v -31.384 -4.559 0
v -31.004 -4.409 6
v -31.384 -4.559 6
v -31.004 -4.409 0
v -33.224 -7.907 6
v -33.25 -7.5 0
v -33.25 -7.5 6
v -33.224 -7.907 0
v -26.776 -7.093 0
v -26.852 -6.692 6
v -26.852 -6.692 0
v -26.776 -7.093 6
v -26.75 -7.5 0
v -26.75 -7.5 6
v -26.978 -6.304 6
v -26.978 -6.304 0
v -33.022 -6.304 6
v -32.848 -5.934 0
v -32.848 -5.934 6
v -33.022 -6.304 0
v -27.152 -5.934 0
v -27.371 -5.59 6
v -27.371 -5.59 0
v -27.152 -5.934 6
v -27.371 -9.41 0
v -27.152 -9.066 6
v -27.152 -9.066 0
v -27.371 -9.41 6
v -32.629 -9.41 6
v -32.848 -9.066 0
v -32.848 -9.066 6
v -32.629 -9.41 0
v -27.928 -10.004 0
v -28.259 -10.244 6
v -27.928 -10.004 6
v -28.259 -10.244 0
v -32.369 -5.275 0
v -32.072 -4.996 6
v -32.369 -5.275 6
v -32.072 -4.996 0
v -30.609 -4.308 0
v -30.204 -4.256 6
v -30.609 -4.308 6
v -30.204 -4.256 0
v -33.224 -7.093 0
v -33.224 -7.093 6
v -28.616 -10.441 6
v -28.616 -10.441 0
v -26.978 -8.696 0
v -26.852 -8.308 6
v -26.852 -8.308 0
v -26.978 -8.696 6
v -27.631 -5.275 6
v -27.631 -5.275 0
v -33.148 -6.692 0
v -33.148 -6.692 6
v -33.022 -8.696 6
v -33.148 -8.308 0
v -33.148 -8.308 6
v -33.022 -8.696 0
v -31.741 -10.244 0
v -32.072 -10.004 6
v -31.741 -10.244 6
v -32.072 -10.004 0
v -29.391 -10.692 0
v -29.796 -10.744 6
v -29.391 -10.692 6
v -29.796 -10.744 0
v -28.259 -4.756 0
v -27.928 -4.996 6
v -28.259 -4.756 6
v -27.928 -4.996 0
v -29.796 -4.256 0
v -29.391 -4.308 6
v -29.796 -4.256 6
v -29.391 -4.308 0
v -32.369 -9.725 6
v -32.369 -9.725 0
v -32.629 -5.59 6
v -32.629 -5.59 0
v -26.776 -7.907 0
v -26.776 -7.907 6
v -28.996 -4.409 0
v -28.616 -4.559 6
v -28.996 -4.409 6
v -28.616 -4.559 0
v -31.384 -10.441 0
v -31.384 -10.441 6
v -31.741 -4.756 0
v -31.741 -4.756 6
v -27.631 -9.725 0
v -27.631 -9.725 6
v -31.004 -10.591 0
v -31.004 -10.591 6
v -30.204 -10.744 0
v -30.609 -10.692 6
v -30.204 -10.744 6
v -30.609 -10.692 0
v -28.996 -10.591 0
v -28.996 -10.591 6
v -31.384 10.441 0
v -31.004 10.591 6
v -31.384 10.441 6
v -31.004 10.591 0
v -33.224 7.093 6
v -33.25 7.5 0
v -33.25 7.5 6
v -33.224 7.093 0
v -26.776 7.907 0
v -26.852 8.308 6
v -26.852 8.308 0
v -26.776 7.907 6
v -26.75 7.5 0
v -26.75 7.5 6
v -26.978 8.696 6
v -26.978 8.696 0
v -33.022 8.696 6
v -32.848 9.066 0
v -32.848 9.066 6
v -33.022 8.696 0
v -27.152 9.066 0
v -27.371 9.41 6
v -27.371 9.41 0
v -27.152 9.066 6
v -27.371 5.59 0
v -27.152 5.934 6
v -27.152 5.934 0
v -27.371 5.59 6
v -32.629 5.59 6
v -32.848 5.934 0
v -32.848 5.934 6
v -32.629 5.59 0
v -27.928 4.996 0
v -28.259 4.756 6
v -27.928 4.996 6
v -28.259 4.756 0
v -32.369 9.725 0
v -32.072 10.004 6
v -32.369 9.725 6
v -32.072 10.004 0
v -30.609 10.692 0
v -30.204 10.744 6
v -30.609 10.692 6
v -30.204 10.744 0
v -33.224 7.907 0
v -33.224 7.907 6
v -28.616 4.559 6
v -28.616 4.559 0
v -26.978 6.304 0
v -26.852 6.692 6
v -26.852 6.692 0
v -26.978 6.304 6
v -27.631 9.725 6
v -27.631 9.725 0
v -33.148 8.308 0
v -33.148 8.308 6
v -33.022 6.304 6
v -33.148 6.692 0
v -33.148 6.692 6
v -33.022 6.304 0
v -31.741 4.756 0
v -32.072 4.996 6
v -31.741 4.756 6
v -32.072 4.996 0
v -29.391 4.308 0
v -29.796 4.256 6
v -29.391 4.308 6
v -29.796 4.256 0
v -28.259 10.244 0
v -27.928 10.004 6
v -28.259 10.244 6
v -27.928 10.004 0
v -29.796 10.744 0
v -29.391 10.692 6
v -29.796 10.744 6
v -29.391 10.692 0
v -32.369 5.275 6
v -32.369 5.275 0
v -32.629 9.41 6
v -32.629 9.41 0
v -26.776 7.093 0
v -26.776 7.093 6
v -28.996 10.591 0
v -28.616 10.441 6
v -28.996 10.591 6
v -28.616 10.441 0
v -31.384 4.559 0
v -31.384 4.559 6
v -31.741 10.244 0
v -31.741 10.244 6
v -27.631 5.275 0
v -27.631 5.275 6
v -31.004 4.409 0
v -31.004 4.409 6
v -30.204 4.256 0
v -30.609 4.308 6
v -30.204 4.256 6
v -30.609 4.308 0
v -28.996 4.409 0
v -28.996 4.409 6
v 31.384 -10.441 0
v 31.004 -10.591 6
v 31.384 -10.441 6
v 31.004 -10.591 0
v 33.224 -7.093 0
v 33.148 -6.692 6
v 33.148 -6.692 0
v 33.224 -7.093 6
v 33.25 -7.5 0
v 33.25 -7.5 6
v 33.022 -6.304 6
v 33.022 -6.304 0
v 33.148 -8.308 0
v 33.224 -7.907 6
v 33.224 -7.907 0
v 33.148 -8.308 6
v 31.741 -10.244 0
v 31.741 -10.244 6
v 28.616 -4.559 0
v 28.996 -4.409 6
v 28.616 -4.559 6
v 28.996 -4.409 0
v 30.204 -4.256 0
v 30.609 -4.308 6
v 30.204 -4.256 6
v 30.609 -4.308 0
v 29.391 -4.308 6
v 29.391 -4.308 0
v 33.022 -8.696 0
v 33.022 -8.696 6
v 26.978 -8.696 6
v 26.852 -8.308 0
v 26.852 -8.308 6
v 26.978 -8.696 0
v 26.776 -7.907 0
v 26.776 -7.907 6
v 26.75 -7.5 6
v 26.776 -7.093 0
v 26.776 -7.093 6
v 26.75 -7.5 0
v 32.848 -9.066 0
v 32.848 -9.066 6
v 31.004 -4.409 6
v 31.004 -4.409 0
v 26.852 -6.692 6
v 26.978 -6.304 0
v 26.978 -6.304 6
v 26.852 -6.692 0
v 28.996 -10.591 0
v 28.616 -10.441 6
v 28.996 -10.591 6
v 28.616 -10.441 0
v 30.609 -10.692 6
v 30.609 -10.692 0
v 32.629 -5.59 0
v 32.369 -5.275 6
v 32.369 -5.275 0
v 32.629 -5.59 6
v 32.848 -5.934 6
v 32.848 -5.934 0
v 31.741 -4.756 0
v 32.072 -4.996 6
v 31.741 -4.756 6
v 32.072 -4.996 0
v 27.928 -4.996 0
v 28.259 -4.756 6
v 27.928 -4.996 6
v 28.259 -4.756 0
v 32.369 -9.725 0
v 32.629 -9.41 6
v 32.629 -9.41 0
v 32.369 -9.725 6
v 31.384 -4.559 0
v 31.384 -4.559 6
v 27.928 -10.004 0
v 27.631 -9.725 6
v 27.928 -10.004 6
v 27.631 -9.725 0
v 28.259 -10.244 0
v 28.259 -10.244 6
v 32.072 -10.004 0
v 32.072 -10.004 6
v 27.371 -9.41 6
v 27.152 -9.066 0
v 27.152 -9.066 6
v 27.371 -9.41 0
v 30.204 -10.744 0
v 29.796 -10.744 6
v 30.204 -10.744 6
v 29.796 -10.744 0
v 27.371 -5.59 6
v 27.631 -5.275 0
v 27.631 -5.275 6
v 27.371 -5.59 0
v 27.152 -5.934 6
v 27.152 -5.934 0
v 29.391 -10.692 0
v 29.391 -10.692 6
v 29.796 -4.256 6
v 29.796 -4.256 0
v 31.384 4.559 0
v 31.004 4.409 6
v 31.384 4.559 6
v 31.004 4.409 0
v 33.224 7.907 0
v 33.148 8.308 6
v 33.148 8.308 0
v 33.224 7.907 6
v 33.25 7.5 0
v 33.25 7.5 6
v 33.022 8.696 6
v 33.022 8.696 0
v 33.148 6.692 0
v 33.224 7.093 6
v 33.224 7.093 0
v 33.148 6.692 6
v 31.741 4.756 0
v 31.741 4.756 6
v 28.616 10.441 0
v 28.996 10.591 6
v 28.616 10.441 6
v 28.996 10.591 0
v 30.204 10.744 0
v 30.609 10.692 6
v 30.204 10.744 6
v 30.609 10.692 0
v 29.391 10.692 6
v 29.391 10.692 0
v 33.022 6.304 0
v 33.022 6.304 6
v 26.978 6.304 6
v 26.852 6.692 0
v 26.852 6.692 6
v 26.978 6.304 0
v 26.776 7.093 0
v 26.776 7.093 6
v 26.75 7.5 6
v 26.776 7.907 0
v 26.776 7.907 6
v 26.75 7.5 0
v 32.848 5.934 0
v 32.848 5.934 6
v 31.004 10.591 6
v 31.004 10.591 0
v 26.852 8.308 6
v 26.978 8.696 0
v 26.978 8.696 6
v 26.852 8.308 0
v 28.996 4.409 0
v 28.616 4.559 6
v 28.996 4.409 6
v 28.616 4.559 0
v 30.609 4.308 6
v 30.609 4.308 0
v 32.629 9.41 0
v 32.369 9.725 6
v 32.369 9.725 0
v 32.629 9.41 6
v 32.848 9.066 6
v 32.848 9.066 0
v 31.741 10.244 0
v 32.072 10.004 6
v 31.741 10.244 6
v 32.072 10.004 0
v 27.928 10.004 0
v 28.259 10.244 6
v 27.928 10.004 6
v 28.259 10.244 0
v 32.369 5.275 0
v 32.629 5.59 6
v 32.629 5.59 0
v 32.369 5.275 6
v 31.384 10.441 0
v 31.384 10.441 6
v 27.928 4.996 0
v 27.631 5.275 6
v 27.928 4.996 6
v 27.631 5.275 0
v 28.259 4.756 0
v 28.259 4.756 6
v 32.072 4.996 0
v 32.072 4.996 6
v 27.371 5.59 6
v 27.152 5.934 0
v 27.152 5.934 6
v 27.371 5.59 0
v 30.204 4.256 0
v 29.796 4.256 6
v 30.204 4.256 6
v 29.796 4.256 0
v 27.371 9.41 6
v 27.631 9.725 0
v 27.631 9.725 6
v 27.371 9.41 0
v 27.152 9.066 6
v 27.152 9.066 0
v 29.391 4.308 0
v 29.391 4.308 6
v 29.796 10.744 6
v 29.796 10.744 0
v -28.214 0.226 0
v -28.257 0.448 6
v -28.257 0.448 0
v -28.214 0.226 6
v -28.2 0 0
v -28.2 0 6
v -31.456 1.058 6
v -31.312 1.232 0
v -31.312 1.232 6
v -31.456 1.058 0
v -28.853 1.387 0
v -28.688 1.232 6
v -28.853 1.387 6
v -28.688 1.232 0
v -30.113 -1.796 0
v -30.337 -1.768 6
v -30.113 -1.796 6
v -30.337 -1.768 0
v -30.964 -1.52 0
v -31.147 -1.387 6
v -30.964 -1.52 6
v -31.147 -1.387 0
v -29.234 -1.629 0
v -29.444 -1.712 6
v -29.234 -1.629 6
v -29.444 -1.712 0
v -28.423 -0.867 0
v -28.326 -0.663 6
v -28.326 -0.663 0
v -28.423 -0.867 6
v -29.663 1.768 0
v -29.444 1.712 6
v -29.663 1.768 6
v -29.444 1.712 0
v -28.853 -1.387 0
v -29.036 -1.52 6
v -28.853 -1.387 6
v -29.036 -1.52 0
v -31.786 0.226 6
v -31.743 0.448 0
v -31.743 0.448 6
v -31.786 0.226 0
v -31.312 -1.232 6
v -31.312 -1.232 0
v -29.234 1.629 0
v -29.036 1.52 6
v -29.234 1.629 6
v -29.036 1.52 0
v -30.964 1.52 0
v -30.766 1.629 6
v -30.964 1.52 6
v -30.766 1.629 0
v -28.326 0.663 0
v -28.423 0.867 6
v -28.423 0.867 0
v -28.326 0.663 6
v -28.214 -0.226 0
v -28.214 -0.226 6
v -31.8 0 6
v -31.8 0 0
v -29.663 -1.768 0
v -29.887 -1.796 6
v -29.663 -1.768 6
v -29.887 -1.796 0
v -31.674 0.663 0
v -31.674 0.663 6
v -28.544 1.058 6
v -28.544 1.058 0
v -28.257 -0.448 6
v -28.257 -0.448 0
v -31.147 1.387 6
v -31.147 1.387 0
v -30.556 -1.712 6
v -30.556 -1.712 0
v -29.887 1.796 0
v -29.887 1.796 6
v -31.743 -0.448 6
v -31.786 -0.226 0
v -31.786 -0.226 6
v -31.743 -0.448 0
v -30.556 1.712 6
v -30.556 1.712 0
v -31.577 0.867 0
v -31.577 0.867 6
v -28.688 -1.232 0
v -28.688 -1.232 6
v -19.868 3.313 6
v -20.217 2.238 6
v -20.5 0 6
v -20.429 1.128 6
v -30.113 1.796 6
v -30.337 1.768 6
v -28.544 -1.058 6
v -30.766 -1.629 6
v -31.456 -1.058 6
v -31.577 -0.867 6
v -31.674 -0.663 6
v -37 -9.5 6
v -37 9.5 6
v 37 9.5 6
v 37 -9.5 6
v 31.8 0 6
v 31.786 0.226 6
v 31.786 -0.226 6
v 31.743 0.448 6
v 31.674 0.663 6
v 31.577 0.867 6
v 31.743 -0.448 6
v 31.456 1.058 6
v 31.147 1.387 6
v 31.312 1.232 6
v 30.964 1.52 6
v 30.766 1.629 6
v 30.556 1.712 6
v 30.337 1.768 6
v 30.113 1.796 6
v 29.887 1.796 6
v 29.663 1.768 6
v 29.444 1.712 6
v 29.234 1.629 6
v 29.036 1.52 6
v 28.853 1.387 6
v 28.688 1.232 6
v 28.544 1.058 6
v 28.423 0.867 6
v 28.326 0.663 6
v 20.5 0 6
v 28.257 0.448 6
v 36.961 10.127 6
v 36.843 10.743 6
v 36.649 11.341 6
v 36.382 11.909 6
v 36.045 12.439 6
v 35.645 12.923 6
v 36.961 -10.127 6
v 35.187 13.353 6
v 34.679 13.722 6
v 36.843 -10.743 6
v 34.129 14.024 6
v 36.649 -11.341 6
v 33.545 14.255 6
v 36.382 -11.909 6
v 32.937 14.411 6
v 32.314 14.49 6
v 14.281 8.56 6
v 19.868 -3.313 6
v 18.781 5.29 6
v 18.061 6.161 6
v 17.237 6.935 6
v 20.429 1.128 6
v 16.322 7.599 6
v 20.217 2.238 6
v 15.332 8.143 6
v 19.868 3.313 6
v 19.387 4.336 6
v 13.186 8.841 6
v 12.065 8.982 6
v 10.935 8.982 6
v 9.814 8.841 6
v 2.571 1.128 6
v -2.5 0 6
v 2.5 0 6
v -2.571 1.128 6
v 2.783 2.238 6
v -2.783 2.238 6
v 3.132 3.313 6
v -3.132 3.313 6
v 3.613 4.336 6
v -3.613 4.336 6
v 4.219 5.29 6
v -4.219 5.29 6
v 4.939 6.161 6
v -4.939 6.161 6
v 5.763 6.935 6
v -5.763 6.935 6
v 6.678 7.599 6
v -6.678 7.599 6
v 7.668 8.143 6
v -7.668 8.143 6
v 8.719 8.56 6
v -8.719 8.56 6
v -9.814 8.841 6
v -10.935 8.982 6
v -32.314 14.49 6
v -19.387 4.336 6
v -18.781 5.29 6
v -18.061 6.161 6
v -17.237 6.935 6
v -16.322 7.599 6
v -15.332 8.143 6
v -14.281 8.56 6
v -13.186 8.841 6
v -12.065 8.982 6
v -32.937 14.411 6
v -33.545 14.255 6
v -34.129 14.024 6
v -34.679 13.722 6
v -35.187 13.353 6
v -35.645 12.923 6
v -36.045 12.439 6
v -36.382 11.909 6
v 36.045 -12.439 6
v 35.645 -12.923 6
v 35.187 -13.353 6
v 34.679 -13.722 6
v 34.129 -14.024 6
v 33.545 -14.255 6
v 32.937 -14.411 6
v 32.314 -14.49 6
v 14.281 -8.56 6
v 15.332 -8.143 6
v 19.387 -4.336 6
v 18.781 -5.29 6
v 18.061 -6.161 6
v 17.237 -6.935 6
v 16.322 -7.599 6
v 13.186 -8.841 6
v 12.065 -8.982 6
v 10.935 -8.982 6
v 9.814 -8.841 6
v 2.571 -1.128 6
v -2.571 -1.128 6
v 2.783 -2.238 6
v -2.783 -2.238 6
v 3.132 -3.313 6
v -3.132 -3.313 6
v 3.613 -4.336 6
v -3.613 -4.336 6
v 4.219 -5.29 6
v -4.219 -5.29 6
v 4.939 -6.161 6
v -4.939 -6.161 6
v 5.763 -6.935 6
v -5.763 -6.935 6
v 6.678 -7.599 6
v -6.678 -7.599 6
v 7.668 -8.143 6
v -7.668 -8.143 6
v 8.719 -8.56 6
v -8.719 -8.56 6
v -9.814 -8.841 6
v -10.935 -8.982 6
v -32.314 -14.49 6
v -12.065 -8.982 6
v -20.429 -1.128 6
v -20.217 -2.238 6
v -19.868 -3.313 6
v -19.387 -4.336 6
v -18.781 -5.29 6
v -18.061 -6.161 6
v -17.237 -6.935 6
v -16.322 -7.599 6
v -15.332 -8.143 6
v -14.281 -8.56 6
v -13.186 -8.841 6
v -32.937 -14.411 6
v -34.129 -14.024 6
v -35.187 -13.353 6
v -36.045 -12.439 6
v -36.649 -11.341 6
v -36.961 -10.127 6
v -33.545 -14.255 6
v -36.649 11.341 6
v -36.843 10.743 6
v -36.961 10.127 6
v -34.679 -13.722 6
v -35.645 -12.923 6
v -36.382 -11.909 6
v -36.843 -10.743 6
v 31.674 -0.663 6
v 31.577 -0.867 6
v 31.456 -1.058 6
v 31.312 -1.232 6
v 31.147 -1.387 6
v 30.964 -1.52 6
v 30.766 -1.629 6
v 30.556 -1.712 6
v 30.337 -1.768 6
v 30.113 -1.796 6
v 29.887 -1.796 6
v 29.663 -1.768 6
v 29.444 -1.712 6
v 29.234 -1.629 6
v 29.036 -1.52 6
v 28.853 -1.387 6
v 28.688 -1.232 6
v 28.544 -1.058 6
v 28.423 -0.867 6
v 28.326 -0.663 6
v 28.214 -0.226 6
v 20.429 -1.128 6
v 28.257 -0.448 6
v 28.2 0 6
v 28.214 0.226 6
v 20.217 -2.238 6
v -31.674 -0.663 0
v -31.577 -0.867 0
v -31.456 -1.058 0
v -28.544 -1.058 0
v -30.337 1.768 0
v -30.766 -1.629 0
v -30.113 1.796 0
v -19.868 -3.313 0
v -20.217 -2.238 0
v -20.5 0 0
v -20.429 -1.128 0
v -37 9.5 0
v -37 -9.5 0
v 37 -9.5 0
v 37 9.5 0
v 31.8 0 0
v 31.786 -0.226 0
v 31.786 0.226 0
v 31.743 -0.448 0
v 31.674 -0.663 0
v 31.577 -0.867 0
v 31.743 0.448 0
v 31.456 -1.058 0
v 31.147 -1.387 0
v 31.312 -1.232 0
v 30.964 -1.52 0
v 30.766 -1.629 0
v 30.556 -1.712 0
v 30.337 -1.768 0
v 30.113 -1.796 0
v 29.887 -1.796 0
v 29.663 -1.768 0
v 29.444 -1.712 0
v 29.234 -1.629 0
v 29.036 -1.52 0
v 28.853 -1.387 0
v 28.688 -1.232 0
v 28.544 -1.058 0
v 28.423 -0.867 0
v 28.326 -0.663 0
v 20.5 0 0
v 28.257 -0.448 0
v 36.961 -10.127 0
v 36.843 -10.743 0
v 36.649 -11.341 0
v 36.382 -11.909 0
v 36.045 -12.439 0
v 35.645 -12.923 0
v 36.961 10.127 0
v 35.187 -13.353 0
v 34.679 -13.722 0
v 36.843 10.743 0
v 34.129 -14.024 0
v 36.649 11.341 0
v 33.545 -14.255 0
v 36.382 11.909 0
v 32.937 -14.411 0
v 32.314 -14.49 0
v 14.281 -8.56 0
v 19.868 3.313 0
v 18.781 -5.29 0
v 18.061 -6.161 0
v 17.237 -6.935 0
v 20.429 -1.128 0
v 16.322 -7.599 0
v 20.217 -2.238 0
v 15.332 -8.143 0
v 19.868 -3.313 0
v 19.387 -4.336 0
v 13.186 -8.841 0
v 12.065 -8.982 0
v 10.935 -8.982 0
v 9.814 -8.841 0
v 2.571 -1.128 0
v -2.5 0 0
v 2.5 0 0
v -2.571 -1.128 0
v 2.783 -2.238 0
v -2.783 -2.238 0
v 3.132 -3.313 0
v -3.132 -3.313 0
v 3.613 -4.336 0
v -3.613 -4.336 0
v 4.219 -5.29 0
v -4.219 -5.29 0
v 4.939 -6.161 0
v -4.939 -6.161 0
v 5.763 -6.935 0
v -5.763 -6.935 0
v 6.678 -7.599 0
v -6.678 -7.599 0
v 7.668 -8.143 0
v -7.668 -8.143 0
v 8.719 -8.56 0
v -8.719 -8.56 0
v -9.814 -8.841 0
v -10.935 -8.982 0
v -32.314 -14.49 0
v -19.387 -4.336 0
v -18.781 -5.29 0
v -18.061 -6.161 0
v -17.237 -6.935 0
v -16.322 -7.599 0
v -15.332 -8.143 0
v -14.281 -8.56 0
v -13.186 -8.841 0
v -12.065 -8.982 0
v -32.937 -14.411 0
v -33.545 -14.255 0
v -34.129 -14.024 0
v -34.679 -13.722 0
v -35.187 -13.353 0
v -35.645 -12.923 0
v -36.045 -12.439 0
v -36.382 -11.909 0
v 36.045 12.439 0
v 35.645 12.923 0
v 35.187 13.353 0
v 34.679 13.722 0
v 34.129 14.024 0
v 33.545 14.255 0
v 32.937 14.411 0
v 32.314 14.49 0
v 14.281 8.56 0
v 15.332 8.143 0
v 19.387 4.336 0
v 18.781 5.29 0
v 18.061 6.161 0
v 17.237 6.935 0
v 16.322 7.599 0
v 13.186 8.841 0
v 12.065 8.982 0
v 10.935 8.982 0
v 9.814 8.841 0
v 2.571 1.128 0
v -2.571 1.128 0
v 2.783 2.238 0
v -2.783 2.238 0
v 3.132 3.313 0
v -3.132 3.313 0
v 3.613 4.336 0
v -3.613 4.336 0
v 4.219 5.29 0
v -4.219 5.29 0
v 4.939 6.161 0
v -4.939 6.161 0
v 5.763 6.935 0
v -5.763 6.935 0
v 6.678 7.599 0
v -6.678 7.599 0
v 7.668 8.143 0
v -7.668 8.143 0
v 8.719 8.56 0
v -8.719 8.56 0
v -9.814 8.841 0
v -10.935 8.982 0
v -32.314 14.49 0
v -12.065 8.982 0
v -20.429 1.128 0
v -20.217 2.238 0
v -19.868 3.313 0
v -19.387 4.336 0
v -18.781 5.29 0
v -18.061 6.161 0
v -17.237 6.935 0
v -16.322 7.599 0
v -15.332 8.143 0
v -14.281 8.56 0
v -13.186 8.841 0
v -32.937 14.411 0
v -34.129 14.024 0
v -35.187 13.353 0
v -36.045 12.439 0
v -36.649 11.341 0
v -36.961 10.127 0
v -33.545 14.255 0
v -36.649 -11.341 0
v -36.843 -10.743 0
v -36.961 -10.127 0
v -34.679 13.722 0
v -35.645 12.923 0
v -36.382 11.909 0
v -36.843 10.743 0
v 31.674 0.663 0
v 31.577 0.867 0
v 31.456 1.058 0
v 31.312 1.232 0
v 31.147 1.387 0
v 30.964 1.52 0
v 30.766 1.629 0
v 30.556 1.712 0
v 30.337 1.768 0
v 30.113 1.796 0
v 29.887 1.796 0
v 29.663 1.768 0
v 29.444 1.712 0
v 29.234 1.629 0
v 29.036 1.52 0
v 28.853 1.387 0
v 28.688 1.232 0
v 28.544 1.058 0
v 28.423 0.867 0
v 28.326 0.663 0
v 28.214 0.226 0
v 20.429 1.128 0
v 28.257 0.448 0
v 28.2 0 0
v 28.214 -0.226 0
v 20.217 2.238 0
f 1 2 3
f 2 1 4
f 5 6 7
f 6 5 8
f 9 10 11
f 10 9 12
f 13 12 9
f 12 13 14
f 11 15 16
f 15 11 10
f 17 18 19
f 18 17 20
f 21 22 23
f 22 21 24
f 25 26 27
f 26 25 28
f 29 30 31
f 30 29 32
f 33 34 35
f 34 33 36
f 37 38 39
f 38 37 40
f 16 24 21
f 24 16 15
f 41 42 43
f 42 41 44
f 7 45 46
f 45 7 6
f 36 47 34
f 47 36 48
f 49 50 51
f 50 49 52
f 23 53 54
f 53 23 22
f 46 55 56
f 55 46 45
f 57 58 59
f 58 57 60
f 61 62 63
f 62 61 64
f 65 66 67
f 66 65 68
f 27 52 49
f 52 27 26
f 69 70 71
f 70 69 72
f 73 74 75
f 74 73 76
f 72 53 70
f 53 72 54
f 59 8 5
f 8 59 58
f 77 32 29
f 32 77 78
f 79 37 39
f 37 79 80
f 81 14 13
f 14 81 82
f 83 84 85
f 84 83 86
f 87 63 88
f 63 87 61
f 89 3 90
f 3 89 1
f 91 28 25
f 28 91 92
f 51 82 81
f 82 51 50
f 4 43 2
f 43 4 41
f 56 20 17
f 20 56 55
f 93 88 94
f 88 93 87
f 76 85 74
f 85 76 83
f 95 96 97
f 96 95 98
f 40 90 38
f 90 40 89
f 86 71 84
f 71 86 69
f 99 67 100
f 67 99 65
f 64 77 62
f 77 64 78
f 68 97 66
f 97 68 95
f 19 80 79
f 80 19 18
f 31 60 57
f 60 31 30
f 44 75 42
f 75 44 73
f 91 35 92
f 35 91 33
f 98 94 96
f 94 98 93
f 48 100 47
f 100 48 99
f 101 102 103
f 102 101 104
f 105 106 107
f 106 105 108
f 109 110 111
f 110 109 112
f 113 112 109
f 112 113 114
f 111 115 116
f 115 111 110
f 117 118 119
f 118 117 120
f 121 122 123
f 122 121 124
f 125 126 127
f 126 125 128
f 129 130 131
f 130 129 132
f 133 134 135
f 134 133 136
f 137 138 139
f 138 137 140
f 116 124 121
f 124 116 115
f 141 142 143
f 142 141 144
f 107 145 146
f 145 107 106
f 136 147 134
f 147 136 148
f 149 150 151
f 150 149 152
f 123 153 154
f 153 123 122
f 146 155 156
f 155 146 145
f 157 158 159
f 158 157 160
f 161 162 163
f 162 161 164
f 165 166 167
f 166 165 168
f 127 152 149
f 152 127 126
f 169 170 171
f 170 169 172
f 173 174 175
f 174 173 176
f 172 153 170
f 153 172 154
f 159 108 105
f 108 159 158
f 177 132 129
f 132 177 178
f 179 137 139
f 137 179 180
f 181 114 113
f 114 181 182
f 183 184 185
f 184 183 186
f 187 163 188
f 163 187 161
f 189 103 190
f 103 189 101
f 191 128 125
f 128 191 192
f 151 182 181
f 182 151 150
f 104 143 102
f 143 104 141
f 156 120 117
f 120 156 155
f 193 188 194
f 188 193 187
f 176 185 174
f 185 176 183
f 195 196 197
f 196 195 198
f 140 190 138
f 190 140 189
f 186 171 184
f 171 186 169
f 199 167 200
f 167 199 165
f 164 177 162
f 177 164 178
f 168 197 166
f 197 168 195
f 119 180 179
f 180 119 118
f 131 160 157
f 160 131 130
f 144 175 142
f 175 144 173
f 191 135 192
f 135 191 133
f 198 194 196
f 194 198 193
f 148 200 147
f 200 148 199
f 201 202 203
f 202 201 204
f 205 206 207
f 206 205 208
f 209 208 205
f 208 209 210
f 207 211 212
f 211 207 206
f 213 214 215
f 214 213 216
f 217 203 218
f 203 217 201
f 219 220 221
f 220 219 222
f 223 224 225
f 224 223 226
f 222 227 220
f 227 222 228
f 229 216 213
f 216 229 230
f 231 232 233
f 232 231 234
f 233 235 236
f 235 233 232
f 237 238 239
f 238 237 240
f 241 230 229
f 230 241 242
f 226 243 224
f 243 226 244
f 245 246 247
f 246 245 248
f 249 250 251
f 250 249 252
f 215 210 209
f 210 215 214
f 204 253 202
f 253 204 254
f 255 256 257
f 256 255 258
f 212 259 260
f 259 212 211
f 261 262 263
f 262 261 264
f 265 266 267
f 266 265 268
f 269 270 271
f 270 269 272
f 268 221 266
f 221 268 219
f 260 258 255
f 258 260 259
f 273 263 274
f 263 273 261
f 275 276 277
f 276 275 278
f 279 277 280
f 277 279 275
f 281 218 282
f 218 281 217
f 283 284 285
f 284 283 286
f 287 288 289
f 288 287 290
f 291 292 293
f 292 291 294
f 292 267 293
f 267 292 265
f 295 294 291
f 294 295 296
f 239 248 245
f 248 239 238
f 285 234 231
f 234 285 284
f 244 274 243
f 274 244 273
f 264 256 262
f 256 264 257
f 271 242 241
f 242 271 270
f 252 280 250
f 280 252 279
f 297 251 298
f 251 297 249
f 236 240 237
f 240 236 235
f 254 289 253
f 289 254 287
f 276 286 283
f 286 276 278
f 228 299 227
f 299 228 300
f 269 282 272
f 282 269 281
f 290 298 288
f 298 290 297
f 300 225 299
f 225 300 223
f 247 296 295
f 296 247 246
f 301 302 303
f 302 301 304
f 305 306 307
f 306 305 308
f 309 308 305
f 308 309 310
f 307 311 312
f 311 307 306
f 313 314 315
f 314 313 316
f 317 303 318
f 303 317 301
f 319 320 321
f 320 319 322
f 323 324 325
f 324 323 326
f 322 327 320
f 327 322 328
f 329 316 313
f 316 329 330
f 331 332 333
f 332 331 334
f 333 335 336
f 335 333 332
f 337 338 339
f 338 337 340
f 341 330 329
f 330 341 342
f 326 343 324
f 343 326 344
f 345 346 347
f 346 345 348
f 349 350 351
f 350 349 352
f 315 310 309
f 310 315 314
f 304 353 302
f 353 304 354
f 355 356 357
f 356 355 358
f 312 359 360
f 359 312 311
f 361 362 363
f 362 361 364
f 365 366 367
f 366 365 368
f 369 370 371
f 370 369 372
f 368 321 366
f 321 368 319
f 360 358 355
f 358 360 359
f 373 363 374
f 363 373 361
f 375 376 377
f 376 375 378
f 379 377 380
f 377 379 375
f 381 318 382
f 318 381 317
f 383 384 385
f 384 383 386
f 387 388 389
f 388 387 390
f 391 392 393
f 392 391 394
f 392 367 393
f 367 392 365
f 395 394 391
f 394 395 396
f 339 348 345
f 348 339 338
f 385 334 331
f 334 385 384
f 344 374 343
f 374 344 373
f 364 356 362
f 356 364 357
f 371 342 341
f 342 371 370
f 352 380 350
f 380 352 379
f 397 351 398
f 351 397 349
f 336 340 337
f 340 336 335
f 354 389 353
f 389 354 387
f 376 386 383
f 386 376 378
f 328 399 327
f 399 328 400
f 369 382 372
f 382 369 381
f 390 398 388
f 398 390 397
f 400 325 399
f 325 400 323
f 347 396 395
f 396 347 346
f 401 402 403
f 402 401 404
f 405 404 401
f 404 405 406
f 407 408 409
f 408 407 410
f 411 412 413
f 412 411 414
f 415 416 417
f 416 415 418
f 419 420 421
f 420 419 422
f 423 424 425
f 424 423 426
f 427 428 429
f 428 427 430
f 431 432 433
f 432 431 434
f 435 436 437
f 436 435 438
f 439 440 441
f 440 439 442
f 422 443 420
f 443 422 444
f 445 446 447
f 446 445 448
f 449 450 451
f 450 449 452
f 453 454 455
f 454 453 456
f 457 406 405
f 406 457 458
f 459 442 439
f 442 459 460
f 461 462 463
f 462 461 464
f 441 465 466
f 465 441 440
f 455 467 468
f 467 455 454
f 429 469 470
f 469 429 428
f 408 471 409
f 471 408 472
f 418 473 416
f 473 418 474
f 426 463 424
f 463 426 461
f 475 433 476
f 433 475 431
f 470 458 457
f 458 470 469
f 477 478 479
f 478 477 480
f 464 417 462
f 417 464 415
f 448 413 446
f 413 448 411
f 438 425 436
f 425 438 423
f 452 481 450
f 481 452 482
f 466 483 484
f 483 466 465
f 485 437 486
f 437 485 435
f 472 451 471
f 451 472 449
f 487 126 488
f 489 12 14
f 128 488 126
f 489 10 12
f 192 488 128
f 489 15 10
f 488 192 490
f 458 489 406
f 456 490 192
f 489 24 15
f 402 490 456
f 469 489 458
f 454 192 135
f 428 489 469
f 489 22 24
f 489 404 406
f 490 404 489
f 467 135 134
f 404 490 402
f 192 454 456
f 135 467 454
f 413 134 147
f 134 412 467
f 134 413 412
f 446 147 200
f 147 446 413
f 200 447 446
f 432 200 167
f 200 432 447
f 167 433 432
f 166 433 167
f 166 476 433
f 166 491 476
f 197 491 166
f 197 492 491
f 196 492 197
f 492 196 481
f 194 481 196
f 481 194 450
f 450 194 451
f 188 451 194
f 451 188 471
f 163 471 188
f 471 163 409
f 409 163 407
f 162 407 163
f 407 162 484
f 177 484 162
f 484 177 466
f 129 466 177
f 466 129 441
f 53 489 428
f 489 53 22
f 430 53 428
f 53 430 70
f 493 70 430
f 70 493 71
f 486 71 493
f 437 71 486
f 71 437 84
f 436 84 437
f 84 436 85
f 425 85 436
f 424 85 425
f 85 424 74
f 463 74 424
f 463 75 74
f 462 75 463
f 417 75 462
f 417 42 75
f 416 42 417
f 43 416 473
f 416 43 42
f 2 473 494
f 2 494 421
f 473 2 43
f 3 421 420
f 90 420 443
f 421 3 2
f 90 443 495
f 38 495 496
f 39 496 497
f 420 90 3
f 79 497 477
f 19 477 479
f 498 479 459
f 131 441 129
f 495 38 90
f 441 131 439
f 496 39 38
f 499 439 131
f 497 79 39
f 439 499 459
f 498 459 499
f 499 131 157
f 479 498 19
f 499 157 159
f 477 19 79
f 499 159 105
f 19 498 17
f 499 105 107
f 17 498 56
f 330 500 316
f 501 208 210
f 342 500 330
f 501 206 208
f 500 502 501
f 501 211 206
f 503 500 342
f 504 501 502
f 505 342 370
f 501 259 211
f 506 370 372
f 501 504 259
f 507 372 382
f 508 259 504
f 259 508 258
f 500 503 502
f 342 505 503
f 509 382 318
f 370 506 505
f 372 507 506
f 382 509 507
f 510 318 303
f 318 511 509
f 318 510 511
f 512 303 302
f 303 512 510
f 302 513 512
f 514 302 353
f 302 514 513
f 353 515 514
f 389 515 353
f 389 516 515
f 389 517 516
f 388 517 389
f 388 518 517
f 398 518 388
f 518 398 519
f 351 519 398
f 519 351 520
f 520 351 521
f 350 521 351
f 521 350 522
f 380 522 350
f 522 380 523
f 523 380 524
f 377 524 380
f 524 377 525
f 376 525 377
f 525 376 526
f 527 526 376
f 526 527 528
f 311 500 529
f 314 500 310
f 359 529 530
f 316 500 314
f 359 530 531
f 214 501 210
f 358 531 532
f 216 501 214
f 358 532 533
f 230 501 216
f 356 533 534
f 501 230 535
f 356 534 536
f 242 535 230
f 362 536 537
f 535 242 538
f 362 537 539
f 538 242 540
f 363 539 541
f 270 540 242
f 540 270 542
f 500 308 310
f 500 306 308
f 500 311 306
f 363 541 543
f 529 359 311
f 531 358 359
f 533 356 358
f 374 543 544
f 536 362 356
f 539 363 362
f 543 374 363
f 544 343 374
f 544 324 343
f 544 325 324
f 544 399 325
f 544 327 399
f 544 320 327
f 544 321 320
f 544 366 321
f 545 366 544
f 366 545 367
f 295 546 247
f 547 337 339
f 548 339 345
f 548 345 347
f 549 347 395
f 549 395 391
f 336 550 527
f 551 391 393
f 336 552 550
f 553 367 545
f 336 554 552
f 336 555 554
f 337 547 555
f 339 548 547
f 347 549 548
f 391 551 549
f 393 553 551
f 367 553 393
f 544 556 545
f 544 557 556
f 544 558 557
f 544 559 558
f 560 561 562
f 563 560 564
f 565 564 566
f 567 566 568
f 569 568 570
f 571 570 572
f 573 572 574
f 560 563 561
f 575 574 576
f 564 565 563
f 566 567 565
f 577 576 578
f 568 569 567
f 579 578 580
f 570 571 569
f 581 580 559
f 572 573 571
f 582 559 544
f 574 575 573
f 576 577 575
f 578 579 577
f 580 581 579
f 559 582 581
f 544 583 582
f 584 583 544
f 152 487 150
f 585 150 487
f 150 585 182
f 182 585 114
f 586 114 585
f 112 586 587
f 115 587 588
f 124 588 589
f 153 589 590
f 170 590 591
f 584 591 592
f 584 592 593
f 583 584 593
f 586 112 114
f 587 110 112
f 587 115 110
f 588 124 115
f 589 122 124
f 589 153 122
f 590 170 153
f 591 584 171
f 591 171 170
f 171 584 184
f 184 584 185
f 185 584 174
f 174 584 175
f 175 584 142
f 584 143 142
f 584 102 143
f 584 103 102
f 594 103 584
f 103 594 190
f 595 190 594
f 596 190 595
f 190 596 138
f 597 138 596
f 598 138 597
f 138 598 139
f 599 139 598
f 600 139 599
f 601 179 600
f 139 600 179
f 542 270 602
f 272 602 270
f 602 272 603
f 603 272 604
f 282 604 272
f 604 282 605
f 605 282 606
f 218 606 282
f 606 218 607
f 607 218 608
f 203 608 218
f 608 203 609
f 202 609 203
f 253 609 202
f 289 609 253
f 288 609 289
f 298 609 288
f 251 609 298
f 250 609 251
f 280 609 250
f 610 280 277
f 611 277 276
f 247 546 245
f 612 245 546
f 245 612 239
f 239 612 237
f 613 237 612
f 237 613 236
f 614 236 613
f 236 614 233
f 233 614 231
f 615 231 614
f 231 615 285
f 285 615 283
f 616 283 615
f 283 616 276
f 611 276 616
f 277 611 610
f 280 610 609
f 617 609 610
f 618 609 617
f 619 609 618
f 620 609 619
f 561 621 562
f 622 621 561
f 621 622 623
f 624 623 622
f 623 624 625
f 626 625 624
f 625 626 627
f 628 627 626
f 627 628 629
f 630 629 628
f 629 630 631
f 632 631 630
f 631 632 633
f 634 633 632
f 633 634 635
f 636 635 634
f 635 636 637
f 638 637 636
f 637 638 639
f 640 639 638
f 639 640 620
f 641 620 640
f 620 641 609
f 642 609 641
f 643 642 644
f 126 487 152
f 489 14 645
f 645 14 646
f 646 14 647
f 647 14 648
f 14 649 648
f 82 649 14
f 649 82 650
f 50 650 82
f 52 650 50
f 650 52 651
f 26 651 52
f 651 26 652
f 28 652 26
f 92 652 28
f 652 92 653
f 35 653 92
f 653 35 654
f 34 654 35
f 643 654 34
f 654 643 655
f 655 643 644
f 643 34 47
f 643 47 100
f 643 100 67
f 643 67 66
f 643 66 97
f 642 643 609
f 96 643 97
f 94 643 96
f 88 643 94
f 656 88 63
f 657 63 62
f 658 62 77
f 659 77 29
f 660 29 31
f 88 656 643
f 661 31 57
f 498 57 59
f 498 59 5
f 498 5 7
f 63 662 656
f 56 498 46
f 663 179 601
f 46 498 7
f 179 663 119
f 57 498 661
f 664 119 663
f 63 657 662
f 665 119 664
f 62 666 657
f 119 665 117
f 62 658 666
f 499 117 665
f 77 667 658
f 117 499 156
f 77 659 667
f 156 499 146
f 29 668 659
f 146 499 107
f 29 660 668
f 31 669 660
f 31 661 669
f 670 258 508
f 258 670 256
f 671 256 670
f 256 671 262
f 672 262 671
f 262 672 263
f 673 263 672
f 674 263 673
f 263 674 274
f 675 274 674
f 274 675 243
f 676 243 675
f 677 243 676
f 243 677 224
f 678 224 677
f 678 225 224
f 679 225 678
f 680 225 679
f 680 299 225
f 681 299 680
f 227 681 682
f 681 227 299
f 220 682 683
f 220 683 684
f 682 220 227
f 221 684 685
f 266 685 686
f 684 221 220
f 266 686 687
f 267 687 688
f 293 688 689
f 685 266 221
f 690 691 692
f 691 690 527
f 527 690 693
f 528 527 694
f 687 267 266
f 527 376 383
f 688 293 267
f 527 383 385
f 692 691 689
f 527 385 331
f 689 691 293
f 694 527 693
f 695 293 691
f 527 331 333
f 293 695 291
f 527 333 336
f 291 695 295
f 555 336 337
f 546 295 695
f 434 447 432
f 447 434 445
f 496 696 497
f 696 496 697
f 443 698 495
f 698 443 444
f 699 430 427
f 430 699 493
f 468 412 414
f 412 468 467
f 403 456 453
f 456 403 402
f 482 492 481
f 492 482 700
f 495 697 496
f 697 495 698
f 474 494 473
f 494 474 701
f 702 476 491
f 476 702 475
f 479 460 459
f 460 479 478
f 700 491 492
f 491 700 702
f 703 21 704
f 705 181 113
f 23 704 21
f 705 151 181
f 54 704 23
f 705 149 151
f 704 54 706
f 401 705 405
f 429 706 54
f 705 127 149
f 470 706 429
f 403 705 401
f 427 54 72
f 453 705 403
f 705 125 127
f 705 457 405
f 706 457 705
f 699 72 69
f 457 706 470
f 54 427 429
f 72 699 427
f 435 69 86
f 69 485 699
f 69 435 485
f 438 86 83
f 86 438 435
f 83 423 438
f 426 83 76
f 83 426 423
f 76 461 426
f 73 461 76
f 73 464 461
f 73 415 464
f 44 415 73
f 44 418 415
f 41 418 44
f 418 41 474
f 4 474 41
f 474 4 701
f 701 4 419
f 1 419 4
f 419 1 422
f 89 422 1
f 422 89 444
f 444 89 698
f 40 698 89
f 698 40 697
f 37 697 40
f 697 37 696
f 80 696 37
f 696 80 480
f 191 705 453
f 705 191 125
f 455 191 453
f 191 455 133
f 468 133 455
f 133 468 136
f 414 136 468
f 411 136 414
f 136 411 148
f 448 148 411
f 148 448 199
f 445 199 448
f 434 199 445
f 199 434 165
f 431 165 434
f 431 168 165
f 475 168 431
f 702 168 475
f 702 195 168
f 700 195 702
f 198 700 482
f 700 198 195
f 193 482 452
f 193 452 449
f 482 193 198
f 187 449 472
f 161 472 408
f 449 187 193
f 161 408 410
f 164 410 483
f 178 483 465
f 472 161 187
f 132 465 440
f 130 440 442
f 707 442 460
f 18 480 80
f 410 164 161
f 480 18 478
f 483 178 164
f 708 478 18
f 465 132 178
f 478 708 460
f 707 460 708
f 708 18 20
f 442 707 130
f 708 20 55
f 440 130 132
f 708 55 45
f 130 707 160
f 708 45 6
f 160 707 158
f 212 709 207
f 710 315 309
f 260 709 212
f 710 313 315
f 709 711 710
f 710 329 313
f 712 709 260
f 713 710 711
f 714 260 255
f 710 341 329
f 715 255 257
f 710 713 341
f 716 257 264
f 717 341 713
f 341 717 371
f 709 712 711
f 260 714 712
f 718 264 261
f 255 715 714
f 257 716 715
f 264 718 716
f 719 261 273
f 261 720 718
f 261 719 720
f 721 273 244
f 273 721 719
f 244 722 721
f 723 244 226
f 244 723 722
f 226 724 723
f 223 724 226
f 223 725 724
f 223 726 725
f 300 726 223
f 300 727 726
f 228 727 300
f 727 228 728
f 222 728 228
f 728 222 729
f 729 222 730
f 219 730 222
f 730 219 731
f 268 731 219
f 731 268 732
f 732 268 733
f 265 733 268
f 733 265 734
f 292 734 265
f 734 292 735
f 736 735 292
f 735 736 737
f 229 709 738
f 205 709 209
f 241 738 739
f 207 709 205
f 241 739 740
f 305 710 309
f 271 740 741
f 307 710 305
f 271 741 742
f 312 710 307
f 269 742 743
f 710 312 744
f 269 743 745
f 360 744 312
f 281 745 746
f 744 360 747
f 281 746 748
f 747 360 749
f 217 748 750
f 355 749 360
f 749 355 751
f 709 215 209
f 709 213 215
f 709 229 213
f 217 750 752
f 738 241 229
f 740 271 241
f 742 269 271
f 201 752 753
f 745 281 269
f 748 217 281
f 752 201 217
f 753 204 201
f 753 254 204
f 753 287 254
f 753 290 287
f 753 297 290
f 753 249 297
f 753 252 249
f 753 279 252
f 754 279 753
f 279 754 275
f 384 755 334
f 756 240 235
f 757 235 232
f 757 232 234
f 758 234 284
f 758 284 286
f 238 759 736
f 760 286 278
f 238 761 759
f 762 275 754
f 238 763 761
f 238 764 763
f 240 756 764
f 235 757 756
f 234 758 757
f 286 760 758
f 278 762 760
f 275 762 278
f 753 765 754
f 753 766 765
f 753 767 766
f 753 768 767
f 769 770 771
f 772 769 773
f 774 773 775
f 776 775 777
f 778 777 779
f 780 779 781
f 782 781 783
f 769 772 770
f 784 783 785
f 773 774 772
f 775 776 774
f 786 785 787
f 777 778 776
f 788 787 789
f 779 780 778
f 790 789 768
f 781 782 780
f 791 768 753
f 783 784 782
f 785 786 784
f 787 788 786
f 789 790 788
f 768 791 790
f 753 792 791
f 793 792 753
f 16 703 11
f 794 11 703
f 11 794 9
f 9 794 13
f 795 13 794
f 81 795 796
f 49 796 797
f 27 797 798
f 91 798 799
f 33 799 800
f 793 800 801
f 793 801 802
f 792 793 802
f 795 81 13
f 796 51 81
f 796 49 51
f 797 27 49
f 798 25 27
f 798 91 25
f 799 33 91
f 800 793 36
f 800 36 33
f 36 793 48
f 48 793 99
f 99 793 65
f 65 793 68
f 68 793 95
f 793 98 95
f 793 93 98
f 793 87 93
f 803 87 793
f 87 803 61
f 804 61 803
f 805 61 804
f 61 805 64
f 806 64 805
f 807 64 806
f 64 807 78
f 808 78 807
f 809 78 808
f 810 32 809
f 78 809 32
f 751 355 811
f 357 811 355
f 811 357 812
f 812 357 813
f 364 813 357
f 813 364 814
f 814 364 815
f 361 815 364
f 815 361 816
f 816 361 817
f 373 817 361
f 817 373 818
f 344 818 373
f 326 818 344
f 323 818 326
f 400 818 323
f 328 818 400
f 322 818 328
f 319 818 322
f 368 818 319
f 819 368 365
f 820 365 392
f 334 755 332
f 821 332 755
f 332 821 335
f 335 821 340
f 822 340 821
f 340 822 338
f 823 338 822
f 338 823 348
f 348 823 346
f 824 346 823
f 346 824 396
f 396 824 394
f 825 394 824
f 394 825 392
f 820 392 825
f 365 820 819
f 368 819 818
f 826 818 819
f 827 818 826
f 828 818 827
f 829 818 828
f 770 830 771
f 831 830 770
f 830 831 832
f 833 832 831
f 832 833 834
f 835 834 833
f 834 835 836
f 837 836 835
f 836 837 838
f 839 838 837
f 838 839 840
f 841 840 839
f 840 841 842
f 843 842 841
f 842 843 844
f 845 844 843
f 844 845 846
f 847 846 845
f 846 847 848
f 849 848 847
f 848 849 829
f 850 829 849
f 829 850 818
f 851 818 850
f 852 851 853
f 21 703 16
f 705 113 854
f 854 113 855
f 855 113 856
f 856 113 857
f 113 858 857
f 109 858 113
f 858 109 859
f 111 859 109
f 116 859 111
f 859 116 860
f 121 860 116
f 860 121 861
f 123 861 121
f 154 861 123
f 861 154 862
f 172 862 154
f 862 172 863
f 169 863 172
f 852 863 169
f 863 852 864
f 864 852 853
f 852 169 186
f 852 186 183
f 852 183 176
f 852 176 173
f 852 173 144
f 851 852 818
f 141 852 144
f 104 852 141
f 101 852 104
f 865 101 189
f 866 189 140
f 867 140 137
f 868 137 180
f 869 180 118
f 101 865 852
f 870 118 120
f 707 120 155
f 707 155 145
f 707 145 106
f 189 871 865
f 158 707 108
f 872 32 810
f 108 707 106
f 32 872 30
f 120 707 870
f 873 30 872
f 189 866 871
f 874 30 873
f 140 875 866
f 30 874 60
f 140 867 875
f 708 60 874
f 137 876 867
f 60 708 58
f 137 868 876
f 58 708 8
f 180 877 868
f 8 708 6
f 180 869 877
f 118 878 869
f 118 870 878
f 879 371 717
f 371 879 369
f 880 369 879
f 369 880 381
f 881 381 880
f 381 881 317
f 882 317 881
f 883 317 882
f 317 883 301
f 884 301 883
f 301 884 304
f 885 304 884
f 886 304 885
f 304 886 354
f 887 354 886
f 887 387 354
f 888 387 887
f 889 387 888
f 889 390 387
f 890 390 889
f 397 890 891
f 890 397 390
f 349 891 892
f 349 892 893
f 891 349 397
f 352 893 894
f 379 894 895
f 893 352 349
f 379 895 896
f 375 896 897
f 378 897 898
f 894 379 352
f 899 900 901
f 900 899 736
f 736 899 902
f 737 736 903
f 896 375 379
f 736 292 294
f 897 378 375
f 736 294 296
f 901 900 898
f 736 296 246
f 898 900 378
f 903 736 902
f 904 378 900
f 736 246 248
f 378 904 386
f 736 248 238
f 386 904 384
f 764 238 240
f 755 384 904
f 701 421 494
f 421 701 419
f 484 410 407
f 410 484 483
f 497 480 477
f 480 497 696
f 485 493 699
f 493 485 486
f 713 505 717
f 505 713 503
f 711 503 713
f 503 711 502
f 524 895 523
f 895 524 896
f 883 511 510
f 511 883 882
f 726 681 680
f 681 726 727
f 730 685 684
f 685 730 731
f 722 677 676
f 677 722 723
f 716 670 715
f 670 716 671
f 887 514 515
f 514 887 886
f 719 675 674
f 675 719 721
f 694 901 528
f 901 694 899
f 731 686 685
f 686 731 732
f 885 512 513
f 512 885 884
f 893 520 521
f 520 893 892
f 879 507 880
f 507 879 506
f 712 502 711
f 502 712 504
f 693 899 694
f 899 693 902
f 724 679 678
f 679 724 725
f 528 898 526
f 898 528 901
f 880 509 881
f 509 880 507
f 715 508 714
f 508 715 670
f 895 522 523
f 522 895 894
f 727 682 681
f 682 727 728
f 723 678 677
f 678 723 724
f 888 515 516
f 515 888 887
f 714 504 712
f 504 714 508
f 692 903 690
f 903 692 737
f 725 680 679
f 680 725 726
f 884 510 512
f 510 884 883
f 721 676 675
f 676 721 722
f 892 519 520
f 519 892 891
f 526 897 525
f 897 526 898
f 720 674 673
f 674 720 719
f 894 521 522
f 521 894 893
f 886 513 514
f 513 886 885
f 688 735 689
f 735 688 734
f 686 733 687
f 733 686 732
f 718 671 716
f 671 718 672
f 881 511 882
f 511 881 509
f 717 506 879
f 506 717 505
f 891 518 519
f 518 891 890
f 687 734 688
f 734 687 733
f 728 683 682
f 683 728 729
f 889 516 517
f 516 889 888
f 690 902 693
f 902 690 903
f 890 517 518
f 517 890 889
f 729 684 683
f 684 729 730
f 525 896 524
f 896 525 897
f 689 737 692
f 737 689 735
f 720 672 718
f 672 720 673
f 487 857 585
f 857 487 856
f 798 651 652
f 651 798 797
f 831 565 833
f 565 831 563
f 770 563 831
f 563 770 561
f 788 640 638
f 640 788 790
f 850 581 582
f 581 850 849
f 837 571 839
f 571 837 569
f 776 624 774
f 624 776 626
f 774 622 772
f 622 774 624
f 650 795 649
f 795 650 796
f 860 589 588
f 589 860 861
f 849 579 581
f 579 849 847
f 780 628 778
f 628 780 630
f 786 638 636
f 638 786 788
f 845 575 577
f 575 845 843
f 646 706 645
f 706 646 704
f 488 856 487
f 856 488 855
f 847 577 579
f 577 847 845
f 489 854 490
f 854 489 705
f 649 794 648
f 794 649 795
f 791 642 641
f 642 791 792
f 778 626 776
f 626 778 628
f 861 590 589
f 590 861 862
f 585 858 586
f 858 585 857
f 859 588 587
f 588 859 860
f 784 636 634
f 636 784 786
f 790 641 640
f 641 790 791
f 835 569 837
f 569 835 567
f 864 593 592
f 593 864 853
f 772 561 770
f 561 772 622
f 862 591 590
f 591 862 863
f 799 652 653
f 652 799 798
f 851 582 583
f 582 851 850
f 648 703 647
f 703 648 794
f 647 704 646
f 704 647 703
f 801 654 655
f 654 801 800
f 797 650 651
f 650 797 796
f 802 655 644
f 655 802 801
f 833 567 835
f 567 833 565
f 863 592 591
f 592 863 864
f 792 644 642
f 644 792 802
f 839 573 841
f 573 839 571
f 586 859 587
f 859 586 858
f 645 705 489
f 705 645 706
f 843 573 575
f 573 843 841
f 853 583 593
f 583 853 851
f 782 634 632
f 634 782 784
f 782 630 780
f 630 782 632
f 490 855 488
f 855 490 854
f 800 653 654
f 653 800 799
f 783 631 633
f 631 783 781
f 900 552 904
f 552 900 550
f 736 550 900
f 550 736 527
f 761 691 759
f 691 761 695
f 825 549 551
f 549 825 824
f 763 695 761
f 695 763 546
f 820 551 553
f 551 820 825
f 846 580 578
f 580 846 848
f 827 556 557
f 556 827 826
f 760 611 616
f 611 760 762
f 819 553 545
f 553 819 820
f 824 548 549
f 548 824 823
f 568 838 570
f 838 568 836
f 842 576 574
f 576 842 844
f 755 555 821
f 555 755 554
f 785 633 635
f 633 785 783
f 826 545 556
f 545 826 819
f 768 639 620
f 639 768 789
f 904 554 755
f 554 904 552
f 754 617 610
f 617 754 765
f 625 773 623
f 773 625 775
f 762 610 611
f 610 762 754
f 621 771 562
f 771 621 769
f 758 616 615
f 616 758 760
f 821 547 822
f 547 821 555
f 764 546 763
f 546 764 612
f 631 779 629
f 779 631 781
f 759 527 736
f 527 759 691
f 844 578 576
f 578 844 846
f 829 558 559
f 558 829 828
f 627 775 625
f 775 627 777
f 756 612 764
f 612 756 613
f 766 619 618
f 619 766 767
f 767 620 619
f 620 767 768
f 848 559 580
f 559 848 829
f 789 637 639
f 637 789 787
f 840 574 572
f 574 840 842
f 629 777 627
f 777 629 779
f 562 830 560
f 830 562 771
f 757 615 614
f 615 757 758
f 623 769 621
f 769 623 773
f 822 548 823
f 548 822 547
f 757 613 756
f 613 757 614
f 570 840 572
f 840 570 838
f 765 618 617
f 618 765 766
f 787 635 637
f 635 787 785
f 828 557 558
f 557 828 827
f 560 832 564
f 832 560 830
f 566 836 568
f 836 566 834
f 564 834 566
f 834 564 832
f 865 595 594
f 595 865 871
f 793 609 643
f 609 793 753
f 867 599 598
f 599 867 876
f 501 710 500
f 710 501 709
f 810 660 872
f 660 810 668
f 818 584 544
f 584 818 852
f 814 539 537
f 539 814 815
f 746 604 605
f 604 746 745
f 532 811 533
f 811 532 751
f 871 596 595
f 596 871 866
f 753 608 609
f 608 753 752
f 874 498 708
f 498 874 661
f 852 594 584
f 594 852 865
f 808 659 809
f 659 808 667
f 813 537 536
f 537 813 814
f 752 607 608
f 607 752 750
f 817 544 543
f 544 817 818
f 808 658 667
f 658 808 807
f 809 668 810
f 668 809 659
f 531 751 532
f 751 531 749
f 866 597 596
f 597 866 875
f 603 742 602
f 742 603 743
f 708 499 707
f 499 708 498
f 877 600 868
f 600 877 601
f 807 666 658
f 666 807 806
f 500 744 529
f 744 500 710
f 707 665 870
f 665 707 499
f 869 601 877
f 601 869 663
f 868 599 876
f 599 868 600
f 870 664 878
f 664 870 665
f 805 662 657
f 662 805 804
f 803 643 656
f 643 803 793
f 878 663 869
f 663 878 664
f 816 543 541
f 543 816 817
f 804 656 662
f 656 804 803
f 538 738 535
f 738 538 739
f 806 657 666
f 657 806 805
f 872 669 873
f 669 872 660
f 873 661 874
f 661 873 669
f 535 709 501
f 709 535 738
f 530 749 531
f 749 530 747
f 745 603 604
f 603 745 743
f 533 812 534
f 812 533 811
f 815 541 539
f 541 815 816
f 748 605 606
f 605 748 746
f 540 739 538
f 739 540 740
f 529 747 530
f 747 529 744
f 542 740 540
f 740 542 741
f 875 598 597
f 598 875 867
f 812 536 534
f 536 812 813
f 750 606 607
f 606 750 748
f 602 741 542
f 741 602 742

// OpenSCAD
$fn = 50;


difference() {
	union() {
		hull() {
			translate(v = [-32.0000000000, 9.5000000000, 0]) {
				cylinder(h = 6, r = 5);
			}
			translate(v = [32.0000000000, 9.5000000000, 0]) {
				cylinder(h = 6, r = 5);
			}
			translate(v = [-32.0000000000, -9.5000000000, 0]) {
				cylinder(h = 6, r = 5);
			}
			translate(v = [32.0000000000, -9.5000000000, 0]) {
				cylinder(h = 6, r = 5);
			}
		}
	}
	union() {
		#translate(v = [-30.0000000000, -7.5000000000, 0]) {
			cylinder(h = 6, r = 3.2500000000);
		}
		#translate(v = [-30.0000000000, 7.5000000000, 0]) {
			cylinder(h = 6, r = 3.2500000000);
		}
		#translate(v = [30.0000000000, -7.5000000000, 0]) {
			cylinder(h = 6, r = 3.2500000000);
		}
		#translate(v = [30.0000000000, 7.5000000000, 0]) {
			cylinder(h = 6, r = 3.2500000000);
		}
		#translate(v = [-30.0000000000, -7.5000000000, -100.0000000000]) {
			cylinder(h = 200, r = 3.2500000000);
		}
		#translate(v = [-30.0000000000, 7.5000000000, -100.0000000000]) {
			cylinder(h = 200, r = 3.2500000000);
		}
		#translate(v = [30.0000000000, -7.5000000000, -100.0000000000]) {
			cylinder(h = 200, r = 3.2500000000);
		}
		#translate(v = [30.0000000000, 7.5000000000, -100.0000000000]) {
			cylinder(h = 200, r = 3.2500000000);
		}
		#translate(v = [-30.0000000000, -7.5000000000, 0]) {
			cylinder(h = 6, r = 1.8000000000);
		}
		#translate(v = [-30.0000000000, 0.0000000000, 0]) {
			cylinder(h = 6, r = 1.8000000000);
		}
		#translate(v = [-30.0000000000, 7.5000000000, 0]) {
			cylinder(h = 6, r = 1.8000000000);
		}
		#translate(v = [30.0000000000, -7.5000000000, 0]) {
			cylinder(h = 6, r = 1.8000000000);
		}
		#translate(v = [30.0000000000, 0.0000000000, 0]) {
			cylinder(h = 6, r = 1.8000000000);
		}
		#translate(v = [30.0000000000, 7.5000000000, 0]) {
			cylinder(h = 6, r = 1.8000000000);
		}
		#translate(v = [-30.0000000000, -7.5000000000, 0]) {
			cylinder(h = 6, r = 1.8000000000);
		}
		#translate(v = [-30.0000000000, 0.0000000000, 0]) {
			cylinder(h = 6, r = 1.8000000000);
		}
		#translate(v = [-30.0000000000, 7.5000000000, 0]) {
			cylinder(h = 6, r = 1.8000000000);
		}
		#translate(v = [30.0000000000, -7.5000000000, 0]) {
			cylinder(h = 6, r = 1.8000000000);
		}
		#translate(v = [30.0000000000, 0.0000000000, 0]) {
			cylinder(h = 6, r = 1.8000000000);
		}
		#translate(v = [30.0000000000, 7.5000000000, 0]) {
			cylinder(h = 6, r = 1.8000000000);
		}
		#translate(v = [-30.0000000000, -7.5000000000, 0]) {
			cylinder(h = 6, r = 1.8000000000);
		}
		#translate(v = [-30.0000000000, 0.0000000000, 0]) {
			cylinder(h = 6, r = 1.8000000000);
		}
		#translate(v = [-30.0000000000, 7.5000000000, 0]) {
			cylinder(h = 6, r = 1.8000000000);
		}
		#translate(v = [30.0000000000, -7.5000000000, 0]) {
			cylinder(h = 6, r = 1.8000000000);
		}
		#translate(v = [30.0000000000, 0.0000000000, 0]) {
			cylinder(h = 6, r = 1.8000000000);
		}
		#translate(v = [30.0000000000, 7.5000000000, 0]) {
			cylinder(h = 6, r = 1.8000000000);
		}
		#translate(v = [-11.5000000000, 0, 0]) {
			cylinder(h = 6, r = 9.0000000000);
		}
		#translate(v = [11.5000000000, 0, 0]) {
			cylinder(h = 6, r = 9.0000000000);
		}
	}
}
